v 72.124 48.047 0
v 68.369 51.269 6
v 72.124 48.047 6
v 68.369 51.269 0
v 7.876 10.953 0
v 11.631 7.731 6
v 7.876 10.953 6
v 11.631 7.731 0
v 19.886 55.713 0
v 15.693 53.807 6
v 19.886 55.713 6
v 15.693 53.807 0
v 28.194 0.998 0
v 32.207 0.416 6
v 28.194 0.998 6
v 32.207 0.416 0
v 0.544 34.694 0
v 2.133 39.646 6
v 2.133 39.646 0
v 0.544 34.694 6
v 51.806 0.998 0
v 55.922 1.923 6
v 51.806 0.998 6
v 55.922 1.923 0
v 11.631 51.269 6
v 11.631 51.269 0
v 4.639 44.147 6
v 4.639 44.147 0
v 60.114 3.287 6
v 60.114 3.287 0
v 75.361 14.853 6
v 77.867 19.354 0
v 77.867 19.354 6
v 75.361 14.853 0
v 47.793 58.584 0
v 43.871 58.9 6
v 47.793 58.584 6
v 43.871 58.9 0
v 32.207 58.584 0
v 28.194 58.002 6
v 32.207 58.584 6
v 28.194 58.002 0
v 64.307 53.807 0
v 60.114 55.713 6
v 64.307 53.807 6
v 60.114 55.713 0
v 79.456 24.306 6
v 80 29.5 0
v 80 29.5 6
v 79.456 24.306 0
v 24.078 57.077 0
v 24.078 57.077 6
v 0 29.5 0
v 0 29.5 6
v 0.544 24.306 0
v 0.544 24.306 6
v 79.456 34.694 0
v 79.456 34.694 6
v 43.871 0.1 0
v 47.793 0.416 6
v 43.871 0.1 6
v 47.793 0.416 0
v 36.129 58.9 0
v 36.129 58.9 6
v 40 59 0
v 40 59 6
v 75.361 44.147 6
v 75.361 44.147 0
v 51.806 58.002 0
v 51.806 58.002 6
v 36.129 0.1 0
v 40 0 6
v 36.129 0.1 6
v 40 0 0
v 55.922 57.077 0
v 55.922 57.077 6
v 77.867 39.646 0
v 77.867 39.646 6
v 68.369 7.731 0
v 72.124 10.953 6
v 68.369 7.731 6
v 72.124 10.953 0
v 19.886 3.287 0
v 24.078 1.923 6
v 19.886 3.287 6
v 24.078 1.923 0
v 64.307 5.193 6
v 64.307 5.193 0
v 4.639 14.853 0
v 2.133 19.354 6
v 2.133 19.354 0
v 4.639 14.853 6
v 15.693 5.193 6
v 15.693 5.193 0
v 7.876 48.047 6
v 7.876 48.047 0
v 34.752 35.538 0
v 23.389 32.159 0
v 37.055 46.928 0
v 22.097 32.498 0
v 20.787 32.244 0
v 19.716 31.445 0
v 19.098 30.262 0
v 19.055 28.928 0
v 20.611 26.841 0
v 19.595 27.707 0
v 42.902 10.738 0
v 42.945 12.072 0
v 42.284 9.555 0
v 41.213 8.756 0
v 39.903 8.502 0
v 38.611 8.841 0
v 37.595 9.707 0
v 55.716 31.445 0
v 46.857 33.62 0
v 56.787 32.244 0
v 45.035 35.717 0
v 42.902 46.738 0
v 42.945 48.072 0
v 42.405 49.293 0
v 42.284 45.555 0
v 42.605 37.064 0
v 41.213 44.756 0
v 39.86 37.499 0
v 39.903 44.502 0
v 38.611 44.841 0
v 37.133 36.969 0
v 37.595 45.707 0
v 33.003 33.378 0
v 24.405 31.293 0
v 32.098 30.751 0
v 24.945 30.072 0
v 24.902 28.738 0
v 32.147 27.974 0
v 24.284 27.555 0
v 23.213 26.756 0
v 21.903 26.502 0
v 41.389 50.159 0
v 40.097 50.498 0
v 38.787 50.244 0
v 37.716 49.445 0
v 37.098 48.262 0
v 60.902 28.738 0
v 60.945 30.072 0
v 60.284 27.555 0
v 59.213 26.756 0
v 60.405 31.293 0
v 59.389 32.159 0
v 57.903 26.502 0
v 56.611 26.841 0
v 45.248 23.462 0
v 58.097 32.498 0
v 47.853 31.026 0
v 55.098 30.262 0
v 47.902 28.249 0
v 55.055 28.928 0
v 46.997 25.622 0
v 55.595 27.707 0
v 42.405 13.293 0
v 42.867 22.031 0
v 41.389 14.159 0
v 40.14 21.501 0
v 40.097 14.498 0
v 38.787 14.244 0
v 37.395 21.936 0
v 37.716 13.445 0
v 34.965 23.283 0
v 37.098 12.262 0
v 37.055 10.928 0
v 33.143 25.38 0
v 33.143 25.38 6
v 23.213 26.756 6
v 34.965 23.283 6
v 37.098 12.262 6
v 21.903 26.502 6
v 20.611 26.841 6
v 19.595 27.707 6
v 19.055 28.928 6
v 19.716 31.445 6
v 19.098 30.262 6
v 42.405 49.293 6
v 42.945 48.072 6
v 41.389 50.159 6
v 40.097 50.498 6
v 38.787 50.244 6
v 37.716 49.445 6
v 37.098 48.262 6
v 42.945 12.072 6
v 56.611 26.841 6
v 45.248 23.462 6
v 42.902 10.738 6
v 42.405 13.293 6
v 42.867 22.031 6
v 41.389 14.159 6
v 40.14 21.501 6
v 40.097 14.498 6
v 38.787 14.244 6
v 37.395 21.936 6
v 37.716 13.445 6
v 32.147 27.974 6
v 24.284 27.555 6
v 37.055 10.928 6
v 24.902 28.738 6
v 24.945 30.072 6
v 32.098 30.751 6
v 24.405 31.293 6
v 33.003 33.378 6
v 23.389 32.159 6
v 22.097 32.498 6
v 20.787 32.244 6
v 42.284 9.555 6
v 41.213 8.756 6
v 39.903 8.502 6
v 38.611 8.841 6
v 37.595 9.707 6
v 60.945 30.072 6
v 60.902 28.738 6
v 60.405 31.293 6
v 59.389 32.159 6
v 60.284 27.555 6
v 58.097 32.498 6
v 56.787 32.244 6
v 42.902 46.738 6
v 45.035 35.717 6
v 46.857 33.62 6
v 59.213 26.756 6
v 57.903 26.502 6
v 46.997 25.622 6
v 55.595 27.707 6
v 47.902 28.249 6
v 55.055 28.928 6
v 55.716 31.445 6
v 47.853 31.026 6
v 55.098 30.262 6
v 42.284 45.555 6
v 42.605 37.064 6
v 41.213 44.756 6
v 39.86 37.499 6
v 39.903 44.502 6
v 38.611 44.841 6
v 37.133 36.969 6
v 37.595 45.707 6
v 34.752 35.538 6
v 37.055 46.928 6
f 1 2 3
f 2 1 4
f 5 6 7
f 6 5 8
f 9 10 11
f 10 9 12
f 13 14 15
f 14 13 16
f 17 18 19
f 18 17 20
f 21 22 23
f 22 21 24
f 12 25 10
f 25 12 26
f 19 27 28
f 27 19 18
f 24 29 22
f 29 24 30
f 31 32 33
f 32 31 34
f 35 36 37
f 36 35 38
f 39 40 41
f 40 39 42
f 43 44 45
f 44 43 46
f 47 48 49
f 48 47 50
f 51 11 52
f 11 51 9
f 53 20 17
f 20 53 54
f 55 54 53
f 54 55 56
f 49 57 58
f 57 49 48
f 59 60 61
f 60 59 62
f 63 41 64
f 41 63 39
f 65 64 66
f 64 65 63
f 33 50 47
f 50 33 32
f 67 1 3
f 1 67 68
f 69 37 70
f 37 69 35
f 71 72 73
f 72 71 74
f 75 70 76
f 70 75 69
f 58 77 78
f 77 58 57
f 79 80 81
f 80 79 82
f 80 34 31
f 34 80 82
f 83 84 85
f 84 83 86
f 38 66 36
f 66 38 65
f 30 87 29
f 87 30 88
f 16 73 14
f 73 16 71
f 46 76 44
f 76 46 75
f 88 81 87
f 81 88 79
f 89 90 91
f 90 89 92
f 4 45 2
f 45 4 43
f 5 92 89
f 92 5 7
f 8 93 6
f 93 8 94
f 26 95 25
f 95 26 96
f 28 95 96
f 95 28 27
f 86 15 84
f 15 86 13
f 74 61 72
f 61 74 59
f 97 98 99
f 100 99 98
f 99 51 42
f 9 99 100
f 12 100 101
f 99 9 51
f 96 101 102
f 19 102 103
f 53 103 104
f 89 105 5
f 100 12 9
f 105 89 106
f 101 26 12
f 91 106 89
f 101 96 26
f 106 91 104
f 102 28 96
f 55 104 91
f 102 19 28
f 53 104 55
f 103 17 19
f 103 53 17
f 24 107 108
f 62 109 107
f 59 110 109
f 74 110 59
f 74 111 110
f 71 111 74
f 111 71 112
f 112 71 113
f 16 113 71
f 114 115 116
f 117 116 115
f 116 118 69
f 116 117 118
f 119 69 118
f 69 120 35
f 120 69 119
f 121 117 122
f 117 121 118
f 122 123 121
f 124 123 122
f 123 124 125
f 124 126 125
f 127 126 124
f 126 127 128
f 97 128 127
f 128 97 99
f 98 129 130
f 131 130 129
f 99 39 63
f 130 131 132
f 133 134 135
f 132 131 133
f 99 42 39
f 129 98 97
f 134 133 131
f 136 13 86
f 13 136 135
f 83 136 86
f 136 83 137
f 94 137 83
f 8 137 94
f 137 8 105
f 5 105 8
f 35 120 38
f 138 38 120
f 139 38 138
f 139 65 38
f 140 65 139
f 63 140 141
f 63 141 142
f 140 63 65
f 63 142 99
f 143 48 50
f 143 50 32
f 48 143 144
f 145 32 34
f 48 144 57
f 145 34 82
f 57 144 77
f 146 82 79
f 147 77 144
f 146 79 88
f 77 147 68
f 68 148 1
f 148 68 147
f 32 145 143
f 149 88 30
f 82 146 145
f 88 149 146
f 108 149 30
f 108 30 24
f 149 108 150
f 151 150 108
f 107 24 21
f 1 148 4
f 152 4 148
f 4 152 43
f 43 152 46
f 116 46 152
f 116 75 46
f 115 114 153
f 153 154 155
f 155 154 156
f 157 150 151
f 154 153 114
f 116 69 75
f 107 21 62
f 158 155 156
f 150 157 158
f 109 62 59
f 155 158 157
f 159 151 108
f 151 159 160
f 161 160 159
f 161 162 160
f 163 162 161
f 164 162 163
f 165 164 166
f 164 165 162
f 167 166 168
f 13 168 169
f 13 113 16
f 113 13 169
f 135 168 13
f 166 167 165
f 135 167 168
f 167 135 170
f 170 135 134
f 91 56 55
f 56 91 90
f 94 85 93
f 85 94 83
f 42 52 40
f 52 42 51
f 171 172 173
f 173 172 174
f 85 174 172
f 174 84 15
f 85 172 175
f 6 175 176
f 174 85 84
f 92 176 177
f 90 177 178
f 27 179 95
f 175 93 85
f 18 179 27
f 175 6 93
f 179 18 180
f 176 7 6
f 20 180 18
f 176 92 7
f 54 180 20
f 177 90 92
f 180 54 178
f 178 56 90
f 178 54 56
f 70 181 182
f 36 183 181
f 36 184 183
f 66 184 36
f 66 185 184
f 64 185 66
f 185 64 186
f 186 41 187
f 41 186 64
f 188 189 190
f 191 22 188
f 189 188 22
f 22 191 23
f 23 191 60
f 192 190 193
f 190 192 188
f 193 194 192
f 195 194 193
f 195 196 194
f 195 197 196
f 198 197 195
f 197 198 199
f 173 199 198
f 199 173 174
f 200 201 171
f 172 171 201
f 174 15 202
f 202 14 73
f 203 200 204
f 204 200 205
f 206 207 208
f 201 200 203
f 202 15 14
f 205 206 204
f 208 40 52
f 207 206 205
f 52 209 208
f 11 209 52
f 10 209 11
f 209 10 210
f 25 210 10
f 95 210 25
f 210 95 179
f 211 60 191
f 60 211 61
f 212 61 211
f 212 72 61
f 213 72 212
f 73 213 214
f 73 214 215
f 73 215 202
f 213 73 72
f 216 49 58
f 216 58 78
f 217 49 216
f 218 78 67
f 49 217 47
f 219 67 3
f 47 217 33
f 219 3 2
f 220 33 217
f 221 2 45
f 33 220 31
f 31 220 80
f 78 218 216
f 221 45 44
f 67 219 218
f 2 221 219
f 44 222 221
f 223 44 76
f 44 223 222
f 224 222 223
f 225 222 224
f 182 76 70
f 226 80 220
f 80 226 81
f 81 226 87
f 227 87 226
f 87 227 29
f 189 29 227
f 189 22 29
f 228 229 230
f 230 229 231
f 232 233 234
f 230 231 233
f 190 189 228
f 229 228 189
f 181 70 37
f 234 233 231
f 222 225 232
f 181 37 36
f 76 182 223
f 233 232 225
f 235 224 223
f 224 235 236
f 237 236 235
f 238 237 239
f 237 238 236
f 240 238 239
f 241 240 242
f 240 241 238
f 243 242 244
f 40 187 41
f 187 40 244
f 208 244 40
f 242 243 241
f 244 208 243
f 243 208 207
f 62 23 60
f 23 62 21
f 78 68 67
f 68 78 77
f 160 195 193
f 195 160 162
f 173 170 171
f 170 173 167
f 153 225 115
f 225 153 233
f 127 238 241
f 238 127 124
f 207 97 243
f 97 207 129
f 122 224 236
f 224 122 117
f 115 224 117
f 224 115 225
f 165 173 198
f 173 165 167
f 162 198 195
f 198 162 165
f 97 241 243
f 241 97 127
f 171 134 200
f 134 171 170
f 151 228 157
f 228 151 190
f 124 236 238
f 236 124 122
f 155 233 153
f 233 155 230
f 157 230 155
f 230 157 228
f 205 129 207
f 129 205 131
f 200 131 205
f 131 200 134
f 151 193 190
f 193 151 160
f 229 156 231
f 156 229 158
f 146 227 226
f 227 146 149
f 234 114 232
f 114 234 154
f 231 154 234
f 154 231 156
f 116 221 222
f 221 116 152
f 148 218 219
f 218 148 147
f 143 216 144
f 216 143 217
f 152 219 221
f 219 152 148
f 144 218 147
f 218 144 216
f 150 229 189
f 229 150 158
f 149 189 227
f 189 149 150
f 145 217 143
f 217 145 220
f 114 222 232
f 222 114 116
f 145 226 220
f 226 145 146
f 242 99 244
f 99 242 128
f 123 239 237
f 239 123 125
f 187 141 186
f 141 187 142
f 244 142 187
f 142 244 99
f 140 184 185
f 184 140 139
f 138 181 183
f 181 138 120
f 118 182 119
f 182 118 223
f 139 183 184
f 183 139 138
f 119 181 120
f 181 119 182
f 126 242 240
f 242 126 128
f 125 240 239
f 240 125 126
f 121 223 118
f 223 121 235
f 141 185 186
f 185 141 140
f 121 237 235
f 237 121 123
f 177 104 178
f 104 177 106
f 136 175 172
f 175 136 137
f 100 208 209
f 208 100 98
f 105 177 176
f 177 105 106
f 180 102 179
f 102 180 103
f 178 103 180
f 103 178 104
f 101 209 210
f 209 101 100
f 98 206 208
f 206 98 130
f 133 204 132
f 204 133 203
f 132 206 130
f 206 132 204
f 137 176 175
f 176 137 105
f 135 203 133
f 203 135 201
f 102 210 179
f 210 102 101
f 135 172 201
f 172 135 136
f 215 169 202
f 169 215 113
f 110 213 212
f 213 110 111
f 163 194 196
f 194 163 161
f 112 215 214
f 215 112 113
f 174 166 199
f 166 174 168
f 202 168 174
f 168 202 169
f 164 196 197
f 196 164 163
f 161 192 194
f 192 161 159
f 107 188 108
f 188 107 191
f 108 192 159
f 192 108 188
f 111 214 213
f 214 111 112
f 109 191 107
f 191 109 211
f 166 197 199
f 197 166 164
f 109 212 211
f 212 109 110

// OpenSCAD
$fn = 32;

// ----------------------------------------------------------------------
// Cam plate: double_lobe cam, base R28
// ----------------------------------------------------------------------

// --- parameters (mm) ---
base_r = 28;              // base circle radius
lobe_h = 12;              // cam lobe rise
bore_r = 8;               // shaft bore radius
plate_t = 6;              // plate thickness, Z (extrusion height)
ring_r = 18;              // lightening ring radius
bolt_r = 3;               // lightening hole radius

profile = [[80, 29.5], [79.456, 34.694], [77.867, 39.646], [75.361, 44.147], [72.124, 48.047], [68.369, 51.269], [64.307, 53.807], [60.114, 55.713], [55.922, 57.077], [51.806, 58.002], [47.793, 58.584], [43.871, 58.9], [40, 59], [36.129, 58.9], [32.207, 58.584], [28.194, 58.002], [24.078, 57.077], [19.886, 55.713], [15.693, 53.807], [11.631, 51.269], [7.876, 48.047], [4.639, 44.147], [2.133, 39.646], [0.544, 34.694], [0, 29.5], [0.544, 24.306], [2.133, 19.354], [4.639, 14.853], [7.876, 10.953], [11.631, 7.731], [15.693, 5.193], [19.886, 3.287], [24.078, 1.923], [28.194, 0.998], [32.207, 0.416], [36.129, 0.1], [40, 0], [43.871, 0.1], [47.793, 0.416], [51.806, 0.998], [55.922, 1.923], [60.114, 3.287], [64.307, 5.193], [68.369, 7.731], [72.124, 10.953], [75.361, 14.853], [77.867, 19.354], [79.456, 24.306]];  // primary outline, 48 points, counter clockwise
void_1 = [[47.853, 31.026], [46.857, 33.62], [45.035, 35.717], [42.605, 37.064], [39.86, 37.499], [37.133, 36.969], [34.752, 35.538], [33.003, 33.378], [32.098, 30.751], [32.147, 27.974], [33.143, 25.38], [34.965, 23.283], [37.395, 21.936], [40.14, 21.501], [42.867, 22.031], [45.248, 23.462], [46.997, 25.622], [47.902, 28.249]];  // shaft bore, 18 points
void_2 = [[60.945, 30.072], [60.405, 31.293], [59.389, 32.159], [58.097, 32.498], [56.787, 32.244], [55.716, 31.445], [55.098, 30.262], [55.055, 28.928], [55.595, 27.707], [56.611, 26.841], [57.903, 26.502], [59.213, 26.756], [60.284, 27.555], [60.902, 28.738]];  // lightening hole 1, 14 points
void_3 = [[42.945, 48.072], [42.405, 49.293], [41.389, 50.159], [40.097, 50.498], [38.787, 50.244], [37.716, 49.445], [37.098, 48.262], [37.055, 46.928], [37.595, 45.707], [38.611, 44.841], [39.903, 44.502], [41.213, 44.756], [42.284, 45.555], [42.902, 46.738]];  // lightening hole 2, 14 points
void_4 = [[24.945, 30.072], [24.405, 31.293], [23.389, 32.159], [22.097, 32.498], [20.787, 32.244], [19.716, 31.445], [19.098, 30.262], [19.055, 28.928], [19.595, 27.707], [20.611, 26.841], [21.903, 26.502], [23.213, 26.756], [24.284, 27.555], [24.902, 28.738]];  // lightening hole 3, 14 points
void_5 = [[42.945, 12.072], [42.405, 13.293], [41.389, 14.159], [40.097, 14.498], [38.787, 14.244], [37.716, 13.445], [37.098, 12.262], [37.055, 10.928], [37.595, 9.707], [38.611, 8.841], [39.903, 8.502], [41.213, 8.756], [42.284, 9.555], [42.902, 10.738]];  // lightening hole 4, 14 points

// --- the one profile operation ---
difference() {
  linear_extrude(height = plate_t) polygon(points = profile);
  translate([0, 0, -1])
    linear_extrude(height = plate_t + 2) polygon(points = void_1);
  translate([0, 0, -1])
    linear_extrude(height = plate_t + 2) polygon(points = void_2);
  translate([0, 0, -1])
    linear_extrude(height = plate_t + 2) polygon(points = void_3);
  translate([0, 0, -1])
    linear_extrude(height = plate_t + 2) polygon(points = void_4);
  translate([0, 0, -1])
    linear_extrude(height = plate_t + 2) polygon(points = void_5);
}
